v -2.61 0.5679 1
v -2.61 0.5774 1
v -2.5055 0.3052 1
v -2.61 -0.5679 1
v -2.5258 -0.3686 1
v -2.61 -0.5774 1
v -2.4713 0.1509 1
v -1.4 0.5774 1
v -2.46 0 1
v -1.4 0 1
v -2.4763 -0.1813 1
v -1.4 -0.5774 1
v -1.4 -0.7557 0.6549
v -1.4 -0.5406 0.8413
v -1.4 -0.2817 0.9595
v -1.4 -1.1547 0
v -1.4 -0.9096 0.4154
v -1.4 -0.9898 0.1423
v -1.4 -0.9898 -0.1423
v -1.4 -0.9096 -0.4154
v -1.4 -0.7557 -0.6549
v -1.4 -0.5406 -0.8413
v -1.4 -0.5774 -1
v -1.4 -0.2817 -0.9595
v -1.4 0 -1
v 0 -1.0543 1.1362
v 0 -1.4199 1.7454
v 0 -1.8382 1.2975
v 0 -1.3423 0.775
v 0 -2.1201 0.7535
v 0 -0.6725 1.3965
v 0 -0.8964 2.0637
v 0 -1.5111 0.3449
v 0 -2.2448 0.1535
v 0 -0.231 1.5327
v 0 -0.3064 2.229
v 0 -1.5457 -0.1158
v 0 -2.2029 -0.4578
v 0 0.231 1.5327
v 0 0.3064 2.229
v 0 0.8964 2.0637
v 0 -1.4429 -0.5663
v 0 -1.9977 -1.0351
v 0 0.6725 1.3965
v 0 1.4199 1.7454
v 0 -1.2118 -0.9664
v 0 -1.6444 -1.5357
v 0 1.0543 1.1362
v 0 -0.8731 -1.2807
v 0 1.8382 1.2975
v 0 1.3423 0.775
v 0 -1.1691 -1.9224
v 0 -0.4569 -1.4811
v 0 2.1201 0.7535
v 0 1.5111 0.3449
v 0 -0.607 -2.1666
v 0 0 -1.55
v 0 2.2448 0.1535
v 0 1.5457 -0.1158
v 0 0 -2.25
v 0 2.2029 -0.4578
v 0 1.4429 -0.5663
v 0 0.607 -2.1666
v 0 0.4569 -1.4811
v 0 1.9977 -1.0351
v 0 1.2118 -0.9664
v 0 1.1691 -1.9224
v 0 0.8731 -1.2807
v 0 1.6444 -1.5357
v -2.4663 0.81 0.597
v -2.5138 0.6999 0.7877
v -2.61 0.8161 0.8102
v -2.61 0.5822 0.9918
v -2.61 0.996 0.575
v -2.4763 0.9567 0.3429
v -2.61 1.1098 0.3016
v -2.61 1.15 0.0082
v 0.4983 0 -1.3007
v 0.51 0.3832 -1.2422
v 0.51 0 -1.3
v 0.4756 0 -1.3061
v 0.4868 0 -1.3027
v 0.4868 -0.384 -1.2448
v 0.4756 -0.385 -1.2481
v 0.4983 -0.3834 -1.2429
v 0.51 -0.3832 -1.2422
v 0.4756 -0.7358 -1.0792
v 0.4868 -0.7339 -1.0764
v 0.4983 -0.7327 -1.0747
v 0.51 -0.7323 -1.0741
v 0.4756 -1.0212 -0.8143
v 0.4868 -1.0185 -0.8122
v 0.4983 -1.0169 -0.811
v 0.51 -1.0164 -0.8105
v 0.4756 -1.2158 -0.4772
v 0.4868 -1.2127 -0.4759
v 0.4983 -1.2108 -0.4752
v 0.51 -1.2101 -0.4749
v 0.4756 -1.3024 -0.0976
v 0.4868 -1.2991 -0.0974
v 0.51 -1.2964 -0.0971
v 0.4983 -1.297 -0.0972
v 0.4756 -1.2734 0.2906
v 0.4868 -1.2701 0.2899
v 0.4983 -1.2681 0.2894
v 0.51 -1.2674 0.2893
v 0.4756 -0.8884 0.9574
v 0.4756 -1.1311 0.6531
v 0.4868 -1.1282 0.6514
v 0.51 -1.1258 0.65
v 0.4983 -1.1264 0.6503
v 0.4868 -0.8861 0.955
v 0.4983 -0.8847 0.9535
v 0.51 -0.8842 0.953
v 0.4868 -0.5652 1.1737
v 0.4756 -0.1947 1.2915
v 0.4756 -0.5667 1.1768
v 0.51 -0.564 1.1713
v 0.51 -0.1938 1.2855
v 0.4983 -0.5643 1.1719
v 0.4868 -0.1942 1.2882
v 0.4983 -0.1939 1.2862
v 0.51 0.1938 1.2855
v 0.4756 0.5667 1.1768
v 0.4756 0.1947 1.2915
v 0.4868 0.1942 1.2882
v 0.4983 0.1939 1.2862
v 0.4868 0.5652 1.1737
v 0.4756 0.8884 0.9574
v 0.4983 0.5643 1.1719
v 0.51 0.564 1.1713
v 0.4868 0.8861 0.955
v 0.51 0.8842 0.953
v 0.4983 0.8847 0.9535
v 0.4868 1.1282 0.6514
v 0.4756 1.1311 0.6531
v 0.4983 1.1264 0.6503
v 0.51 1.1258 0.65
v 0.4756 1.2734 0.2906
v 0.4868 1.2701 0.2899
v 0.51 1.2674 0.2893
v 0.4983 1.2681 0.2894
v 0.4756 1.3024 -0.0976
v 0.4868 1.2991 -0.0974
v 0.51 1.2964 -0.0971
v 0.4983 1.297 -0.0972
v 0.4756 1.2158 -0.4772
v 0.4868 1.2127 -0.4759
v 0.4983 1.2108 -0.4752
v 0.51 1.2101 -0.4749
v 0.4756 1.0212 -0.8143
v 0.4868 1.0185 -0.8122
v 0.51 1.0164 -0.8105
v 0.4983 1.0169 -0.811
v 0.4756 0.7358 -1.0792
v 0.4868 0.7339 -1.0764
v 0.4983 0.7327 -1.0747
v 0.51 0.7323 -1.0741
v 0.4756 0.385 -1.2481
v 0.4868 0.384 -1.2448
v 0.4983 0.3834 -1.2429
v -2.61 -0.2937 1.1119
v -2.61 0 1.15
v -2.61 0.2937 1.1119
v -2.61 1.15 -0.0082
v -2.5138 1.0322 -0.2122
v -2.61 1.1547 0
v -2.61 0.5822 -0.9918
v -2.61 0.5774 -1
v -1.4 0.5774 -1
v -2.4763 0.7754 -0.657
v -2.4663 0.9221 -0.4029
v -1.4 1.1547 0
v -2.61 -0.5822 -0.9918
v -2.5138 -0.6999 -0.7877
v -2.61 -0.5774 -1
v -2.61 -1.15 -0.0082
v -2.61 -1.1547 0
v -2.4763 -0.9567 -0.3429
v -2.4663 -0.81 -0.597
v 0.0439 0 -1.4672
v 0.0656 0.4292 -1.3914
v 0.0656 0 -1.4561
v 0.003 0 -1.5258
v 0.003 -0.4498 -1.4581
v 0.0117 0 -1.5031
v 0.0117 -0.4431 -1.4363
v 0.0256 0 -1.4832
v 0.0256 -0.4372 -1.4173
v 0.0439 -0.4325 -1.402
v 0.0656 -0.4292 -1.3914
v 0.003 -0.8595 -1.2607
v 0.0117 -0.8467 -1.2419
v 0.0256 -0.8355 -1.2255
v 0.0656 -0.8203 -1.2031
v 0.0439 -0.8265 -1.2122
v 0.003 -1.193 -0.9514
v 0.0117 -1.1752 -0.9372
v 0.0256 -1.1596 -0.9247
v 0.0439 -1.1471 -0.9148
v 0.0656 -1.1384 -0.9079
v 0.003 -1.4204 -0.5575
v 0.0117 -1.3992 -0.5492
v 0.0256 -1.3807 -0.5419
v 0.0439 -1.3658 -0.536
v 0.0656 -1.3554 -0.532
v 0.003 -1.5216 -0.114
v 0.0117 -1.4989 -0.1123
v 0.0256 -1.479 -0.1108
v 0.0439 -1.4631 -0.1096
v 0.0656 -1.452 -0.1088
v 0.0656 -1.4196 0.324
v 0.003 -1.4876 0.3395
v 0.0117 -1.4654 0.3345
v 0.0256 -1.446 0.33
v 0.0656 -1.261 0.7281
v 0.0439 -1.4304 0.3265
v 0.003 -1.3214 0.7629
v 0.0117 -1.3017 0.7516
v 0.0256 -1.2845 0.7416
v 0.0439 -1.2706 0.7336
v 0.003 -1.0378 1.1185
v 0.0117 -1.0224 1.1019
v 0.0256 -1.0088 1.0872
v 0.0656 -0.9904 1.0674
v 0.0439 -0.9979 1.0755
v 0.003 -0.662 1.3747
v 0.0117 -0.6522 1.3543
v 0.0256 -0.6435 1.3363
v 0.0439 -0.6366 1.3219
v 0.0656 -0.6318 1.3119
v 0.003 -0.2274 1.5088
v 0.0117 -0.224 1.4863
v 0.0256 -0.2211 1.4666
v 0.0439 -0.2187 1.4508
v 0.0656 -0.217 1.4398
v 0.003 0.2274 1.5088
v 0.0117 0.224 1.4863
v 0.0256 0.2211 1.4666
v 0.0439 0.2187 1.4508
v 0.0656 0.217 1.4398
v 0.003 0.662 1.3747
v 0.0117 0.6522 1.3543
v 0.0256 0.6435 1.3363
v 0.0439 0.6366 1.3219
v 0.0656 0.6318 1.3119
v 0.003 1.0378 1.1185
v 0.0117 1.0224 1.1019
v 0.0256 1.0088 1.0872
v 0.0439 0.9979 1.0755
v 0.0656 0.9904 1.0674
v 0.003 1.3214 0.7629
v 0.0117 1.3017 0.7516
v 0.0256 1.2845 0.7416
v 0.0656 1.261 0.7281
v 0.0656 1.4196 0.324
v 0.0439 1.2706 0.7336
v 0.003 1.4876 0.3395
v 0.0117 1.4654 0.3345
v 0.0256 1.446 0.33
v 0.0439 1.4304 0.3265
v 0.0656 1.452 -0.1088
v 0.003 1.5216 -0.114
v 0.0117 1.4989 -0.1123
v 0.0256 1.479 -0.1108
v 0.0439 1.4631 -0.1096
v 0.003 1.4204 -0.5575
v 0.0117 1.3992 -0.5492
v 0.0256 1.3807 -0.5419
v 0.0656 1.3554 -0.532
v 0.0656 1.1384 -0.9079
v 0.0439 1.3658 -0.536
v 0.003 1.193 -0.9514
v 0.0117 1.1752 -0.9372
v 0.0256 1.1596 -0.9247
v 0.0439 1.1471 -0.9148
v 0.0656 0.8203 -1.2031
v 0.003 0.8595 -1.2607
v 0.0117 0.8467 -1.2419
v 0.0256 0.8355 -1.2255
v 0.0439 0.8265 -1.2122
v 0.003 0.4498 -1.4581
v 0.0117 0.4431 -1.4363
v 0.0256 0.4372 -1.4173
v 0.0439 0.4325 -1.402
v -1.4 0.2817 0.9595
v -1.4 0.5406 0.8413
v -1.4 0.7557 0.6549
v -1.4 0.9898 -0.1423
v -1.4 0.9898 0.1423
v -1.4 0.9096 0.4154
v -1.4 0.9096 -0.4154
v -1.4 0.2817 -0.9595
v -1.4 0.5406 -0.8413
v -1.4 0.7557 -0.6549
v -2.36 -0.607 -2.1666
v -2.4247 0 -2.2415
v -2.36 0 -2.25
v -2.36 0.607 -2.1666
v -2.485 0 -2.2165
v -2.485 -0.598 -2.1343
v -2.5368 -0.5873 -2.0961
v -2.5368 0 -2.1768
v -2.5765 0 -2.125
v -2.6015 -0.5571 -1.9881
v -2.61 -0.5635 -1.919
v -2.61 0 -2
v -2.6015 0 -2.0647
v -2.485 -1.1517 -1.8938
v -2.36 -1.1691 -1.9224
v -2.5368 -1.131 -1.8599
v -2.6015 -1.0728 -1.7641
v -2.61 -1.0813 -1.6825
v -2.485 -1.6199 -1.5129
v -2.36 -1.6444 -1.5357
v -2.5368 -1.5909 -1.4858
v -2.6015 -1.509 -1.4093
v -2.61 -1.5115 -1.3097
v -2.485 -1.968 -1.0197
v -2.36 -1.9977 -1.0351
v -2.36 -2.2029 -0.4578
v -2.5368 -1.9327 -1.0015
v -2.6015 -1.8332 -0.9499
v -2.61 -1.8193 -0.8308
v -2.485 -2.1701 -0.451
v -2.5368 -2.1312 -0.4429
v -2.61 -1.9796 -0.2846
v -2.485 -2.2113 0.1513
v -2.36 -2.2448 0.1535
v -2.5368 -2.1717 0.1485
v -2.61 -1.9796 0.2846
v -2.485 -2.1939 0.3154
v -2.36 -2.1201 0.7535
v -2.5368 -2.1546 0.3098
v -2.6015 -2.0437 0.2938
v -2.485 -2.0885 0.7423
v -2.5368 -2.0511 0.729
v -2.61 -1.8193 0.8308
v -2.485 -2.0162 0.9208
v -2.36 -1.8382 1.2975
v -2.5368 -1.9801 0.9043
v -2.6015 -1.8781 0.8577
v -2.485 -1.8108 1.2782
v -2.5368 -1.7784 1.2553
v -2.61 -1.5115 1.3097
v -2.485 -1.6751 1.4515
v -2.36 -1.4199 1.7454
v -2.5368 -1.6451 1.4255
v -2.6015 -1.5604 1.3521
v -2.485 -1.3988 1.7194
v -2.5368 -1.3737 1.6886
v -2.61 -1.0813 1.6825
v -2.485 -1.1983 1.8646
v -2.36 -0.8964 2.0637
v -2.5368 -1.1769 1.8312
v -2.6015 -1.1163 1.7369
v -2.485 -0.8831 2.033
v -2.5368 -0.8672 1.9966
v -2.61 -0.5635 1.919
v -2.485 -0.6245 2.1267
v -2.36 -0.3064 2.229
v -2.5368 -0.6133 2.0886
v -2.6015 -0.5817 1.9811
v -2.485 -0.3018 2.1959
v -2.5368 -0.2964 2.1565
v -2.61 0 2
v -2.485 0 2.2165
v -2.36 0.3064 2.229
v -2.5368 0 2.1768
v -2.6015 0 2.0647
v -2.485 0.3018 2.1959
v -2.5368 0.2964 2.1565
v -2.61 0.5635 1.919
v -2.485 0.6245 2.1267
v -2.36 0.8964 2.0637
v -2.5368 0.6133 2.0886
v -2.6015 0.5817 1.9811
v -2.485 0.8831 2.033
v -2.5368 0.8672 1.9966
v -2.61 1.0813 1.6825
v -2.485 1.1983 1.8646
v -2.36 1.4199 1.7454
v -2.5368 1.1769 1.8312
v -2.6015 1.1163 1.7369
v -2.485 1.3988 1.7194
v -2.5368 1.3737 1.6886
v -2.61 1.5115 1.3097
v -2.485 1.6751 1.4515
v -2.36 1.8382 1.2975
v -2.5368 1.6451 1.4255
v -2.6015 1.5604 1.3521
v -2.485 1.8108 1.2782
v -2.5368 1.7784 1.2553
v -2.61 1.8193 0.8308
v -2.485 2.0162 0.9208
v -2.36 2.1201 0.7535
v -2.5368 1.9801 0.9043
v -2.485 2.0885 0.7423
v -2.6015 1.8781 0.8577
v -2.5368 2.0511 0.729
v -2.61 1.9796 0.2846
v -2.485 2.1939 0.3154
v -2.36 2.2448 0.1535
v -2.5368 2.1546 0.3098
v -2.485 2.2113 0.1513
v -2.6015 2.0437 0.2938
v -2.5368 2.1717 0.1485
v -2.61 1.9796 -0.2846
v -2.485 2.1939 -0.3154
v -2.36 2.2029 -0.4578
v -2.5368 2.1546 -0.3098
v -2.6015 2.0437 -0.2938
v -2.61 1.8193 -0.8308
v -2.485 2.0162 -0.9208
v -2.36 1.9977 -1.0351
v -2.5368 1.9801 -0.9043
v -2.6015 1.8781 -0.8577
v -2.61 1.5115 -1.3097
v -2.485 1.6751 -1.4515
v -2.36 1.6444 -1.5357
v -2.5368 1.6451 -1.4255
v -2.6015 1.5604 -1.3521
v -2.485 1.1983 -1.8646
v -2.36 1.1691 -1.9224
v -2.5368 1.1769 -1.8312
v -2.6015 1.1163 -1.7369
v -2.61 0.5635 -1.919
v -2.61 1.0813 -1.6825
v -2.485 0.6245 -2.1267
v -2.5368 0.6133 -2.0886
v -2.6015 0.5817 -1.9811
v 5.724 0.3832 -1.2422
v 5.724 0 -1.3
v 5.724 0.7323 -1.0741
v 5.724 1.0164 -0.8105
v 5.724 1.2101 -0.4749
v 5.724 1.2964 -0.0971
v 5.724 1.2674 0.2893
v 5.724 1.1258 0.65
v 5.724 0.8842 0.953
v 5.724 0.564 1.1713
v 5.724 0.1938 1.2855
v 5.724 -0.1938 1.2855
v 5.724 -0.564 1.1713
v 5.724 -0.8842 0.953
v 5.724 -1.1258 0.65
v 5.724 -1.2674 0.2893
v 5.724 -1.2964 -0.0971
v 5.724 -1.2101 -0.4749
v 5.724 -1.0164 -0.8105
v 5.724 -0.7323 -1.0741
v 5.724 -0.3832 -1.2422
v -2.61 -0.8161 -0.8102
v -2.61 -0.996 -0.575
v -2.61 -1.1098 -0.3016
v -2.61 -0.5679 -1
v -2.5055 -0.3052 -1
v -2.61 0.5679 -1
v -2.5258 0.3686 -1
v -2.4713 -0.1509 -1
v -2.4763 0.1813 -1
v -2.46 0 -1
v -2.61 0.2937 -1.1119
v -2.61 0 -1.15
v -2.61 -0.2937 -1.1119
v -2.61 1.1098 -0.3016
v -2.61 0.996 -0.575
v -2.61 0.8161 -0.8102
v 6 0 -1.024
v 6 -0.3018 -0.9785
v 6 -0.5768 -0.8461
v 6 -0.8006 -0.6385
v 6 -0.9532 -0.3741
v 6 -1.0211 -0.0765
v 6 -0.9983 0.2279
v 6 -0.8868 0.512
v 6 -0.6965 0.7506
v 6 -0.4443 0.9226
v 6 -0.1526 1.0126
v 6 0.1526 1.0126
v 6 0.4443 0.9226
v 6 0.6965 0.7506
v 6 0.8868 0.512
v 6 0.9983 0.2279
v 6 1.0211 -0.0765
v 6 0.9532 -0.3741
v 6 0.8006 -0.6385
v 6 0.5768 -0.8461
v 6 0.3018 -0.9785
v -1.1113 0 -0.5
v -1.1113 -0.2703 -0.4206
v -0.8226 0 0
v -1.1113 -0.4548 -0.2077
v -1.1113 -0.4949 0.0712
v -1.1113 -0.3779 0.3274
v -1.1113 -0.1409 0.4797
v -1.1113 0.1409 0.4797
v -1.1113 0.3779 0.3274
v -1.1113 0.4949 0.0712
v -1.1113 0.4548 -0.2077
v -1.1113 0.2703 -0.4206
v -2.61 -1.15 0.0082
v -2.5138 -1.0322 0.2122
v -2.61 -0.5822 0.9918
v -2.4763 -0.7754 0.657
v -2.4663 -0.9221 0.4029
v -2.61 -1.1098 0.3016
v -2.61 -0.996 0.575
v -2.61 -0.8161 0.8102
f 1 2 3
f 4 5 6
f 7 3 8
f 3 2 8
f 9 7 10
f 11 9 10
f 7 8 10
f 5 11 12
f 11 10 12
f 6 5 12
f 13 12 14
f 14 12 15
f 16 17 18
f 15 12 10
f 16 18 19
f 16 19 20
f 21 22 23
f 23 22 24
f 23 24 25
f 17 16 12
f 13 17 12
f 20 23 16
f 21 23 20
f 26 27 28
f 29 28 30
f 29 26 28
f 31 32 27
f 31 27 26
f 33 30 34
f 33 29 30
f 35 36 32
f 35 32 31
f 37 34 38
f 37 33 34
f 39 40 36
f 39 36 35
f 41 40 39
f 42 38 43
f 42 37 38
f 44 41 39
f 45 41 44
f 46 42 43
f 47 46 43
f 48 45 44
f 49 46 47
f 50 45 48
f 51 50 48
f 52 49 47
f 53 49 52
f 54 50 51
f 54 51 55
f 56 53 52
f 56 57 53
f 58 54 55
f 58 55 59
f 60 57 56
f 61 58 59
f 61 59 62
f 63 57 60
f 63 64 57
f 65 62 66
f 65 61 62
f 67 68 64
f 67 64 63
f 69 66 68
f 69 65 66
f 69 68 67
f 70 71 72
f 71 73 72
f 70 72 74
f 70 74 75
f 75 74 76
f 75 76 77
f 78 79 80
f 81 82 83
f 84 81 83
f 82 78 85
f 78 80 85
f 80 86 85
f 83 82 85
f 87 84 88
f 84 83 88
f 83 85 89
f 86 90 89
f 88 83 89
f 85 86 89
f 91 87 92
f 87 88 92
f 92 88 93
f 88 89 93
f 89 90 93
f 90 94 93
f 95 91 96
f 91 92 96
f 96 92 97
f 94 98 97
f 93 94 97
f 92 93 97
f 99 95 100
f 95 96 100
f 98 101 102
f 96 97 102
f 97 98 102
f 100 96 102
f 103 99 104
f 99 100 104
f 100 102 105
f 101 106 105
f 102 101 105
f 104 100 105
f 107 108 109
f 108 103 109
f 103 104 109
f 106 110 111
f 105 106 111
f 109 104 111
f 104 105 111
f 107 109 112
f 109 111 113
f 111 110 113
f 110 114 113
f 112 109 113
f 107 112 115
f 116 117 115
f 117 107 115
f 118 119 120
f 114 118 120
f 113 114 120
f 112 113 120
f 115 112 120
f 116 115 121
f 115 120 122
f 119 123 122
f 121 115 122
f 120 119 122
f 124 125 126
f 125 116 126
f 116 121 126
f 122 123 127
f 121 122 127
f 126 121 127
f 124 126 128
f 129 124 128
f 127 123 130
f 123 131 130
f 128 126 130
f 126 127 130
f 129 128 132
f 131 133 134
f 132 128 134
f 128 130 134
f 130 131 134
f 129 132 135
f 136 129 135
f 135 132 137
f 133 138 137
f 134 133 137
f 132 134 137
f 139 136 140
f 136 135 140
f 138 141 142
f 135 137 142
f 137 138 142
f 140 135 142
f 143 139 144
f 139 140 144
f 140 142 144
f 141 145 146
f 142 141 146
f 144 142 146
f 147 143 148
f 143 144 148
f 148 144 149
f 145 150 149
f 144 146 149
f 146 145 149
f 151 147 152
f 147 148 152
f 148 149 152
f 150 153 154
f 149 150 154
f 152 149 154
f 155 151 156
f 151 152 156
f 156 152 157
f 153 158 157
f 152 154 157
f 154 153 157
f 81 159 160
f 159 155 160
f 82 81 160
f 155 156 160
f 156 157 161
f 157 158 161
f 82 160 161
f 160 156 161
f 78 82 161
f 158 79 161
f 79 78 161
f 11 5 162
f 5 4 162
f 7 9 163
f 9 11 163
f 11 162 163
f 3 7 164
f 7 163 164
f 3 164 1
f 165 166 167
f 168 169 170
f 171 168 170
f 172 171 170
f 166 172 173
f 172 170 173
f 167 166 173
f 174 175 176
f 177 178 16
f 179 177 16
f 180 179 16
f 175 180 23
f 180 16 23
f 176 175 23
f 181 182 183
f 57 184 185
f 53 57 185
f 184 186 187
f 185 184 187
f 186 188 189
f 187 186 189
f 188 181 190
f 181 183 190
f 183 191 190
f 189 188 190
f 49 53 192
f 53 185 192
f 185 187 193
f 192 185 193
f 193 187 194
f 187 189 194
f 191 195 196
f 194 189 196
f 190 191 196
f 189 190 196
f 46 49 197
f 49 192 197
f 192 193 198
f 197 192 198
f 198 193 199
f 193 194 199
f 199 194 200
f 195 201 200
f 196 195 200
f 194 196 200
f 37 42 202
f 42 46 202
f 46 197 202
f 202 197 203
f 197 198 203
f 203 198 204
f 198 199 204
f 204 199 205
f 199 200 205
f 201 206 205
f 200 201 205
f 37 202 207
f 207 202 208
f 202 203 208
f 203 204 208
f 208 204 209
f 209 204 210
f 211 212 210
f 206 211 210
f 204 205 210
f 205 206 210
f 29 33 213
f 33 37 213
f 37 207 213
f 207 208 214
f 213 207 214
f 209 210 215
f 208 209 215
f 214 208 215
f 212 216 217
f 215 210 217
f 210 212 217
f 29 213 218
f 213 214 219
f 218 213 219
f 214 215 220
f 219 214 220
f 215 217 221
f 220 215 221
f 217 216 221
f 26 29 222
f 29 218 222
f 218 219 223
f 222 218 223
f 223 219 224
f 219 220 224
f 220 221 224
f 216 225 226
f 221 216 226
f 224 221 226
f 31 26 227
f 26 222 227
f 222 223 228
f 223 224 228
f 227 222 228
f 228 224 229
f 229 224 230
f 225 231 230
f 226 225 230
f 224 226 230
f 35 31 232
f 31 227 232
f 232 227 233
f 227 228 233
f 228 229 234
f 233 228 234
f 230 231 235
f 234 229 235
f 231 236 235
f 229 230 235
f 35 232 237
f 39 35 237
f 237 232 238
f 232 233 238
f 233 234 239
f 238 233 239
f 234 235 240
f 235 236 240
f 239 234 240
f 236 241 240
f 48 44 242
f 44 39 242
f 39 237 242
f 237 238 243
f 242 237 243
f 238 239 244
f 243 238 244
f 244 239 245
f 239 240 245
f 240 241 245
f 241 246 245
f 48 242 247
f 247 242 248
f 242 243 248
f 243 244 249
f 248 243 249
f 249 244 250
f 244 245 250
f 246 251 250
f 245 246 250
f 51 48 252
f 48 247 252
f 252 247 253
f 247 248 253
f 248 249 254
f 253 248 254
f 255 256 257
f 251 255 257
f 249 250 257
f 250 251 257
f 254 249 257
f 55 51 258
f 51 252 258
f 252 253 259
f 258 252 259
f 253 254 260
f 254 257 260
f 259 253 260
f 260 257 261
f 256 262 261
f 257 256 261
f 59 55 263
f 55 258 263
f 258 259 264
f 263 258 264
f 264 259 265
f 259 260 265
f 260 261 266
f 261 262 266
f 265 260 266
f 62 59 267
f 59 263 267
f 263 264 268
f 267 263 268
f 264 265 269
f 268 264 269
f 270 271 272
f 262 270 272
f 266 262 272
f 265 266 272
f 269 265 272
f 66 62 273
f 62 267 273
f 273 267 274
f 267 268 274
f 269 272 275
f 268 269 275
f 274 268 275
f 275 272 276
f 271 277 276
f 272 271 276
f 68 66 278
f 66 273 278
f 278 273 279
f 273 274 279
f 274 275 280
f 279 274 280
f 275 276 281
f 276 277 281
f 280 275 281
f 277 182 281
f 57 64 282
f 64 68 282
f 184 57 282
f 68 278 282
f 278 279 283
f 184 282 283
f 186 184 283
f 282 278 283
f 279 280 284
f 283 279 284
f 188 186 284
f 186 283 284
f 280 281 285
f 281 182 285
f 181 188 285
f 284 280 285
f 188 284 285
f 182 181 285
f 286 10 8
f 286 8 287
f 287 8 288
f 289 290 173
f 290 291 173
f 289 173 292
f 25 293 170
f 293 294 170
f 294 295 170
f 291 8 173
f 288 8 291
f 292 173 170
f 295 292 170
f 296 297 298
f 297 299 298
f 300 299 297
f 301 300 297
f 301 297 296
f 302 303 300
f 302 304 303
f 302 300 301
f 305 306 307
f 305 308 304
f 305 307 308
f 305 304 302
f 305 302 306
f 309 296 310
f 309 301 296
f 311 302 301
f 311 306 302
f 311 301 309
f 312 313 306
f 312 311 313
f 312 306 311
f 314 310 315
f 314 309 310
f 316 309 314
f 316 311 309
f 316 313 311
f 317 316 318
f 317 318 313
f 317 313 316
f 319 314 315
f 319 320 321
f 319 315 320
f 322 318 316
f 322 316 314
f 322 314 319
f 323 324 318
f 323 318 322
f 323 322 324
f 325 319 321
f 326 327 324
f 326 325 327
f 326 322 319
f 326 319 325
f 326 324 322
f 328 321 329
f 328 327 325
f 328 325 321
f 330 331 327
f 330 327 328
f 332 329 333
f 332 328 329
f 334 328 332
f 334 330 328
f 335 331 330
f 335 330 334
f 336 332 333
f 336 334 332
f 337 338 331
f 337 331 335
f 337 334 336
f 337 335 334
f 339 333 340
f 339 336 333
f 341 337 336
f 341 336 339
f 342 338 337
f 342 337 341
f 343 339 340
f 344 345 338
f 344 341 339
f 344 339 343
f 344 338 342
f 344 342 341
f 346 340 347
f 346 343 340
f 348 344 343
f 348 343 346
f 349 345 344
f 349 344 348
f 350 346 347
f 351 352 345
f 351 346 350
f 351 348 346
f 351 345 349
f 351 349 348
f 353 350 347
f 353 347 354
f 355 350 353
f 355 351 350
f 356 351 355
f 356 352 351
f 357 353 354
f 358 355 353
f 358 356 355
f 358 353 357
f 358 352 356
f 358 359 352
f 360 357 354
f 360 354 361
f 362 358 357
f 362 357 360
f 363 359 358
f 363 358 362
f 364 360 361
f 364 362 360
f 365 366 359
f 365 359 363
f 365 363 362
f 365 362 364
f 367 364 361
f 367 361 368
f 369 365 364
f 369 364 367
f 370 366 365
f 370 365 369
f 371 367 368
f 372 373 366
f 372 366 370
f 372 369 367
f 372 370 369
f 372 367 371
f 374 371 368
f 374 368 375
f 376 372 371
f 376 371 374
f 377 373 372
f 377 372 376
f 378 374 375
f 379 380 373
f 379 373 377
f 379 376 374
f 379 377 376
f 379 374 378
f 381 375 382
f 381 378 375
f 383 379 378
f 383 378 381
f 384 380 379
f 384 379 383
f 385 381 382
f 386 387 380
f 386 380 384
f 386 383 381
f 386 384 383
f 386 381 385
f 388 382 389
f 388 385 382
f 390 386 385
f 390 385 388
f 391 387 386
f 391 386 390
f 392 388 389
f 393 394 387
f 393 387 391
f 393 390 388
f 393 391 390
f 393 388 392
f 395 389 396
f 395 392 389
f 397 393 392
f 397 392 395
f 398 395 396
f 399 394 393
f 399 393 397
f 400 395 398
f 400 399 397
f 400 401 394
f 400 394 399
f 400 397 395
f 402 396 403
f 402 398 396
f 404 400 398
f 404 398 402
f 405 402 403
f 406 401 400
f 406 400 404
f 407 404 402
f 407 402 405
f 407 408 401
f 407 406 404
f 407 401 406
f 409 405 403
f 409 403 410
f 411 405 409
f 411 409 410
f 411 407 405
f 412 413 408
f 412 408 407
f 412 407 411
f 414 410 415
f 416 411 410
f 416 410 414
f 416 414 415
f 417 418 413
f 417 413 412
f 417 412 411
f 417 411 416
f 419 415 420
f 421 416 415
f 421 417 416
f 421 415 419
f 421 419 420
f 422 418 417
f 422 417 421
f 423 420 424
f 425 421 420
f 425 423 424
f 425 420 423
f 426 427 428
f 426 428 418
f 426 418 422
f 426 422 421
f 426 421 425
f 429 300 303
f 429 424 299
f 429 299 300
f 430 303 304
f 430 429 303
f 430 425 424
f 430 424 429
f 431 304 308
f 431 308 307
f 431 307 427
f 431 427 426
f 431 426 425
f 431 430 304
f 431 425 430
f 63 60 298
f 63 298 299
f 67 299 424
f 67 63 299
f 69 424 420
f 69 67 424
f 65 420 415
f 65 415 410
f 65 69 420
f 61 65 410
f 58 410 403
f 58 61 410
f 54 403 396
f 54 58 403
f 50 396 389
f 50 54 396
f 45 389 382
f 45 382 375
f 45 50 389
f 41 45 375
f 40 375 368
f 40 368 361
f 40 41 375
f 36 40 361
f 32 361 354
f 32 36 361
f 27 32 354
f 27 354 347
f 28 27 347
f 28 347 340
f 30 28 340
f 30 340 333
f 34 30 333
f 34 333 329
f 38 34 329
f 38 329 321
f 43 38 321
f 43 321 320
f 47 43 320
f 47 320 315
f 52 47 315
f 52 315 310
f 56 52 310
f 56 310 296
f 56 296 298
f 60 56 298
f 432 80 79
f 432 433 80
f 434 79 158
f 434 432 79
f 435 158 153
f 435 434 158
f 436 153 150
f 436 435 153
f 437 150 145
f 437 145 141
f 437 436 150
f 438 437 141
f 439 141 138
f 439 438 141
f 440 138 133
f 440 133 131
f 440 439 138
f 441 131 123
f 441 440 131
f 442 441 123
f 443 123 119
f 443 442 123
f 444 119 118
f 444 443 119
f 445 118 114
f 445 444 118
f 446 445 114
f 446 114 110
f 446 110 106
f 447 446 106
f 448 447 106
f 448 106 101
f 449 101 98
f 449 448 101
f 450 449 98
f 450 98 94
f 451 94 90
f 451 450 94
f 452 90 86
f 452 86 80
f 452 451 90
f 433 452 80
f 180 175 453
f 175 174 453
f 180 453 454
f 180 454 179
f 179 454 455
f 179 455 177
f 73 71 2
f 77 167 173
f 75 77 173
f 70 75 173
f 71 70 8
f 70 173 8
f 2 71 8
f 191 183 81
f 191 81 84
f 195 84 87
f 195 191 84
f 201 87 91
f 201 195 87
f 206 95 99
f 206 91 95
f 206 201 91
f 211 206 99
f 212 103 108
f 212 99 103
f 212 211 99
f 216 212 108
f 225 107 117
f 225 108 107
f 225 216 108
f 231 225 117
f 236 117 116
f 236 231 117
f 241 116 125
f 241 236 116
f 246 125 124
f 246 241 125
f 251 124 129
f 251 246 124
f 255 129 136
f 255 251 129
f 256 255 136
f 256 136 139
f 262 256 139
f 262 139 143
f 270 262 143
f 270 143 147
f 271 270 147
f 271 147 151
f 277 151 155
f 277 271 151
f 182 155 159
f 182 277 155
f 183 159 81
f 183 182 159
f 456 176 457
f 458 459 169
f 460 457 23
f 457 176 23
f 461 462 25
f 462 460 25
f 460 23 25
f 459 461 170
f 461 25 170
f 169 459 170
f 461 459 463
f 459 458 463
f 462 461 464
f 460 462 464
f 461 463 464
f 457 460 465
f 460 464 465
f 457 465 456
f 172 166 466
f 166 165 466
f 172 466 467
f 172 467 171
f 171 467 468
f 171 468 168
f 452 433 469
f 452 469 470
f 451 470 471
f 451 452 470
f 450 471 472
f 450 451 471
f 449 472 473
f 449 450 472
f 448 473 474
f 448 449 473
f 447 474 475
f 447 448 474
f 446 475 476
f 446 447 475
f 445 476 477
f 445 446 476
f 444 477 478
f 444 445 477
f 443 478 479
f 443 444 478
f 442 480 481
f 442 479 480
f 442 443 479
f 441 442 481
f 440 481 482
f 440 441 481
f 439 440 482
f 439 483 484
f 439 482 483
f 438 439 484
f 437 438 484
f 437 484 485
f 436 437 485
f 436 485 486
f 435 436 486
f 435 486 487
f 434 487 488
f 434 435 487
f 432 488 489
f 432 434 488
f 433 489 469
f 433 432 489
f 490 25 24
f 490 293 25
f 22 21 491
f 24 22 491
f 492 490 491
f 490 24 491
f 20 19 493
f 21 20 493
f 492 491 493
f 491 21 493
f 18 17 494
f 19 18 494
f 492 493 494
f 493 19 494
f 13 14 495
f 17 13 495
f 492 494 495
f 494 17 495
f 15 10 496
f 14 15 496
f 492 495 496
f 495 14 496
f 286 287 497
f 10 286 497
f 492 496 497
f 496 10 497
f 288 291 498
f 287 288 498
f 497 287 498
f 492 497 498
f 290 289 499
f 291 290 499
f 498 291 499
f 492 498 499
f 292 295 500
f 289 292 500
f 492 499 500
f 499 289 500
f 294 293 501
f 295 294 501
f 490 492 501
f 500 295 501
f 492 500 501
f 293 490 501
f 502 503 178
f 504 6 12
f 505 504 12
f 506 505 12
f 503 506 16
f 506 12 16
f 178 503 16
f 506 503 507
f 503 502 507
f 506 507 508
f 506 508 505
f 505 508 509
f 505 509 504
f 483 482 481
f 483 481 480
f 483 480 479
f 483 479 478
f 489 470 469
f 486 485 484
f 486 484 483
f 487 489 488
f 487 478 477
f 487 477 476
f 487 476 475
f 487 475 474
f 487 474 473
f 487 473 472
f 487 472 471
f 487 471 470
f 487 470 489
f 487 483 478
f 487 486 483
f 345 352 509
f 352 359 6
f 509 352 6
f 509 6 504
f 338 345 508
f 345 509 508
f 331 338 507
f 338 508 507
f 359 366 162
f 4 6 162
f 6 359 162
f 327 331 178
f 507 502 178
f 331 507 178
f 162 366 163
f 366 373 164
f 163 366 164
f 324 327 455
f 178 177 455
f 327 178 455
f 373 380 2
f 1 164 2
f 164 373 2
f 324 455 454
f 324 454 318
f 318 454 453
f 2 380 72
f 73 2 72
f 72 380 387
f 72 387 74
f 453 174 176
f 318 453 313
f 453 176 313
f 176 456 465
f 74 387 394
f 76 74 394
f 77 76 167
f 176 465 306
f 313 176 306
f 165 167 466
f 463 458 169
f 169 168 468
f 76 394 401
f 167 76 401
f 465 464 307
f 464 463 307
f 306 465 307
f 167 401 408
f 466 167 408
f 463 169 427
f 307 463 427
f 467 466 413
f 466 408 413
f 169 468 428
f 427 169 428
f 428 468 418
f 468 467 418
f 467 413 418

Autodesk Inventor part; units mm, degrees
sketch "Sketch_1" plane through (0, 0, 0) normal (0, 1, 0) x (-1, 0, 0)
  line L0 (-6, 0) -> (2.61, 0)
  line L1 (0.8226, 0) -> (1.4, -1)
  line L2 (1.4, -1) -> (2.46, -1)
  line L3 (2.46, -1) -> (2.61, -1.15)
  line L4 (2.61, -1.15) -> (2.61, -2)
  arc A0 (2.36, -2.25) -> (2.61, -2) centre (2.36, -2) ccw
  line L5 (2.36, -2.25) -> (0, -2.25)
  line L6 (0, -2.25) -> (0, -1.55)
  arc A1 (0, -1.55) -> (-0.0656, -1.4561) centre (-0.1, -1.55) ccw
  line L7 (-0.0656, -1.4561) -> (-0.4756, -1.3061)
  arc A2 (-0.4756, -1.3061) -> (-0.51, -1.3) centre (-0.51, -1.4) ccw
  line L8 (-0.51, -1.3) -> (-5.724, -1.3)
  line L9 (-5.724, -1.3) -> (-6, -1.024)
  line L10 (-6, -1.024) -> (-6, 0)
  line L11 (-6, 0) -> (0.8226, 0)
revolve "Revolution1" add sketch "Sketch_1" angle 360 about axis through (6, 0, 0) along (1, 0, 0)
thread "Thread1" size "M2.6x0.45" class "6g" standard "ISO Metric profile" length 3.724
sketch "Skizze_1" plane through (-1.4, 0, 0) normal (1, 0, 0) x (0, 0, -1)
  line L0 (-1, -0.5774) -> (0, -1.1547)
  line L1 (0, -1.1547) -> (1, -0.5774)
  line L2 (1, -0.5774) -> (1, 0.5774)
  line L3 (1, 0.5774) -> (0, 1.1547)
  line L4 (0, 1.1547) -> (-1, 0.5774)
  line L5 (-1, 0.5774) -> (-1, -0.5774)
extrude "Extrusion1" cut sketch "Skizze_1" against normal blind 2.2
ref_plane "IP1_XY" through (0, 0, 0) normal (1, 0, 0) x (0, 0, -1)
ref_plane "IP1_YZ" through (0, 0, 0) normal (0, 0, -1) x (0, 1, 0)
ref_plane "IP1_ZX" through (0, 0, 0) normal (0, 1, 0) x (1, 0, 0)
ref_plane "IP2_XY" through (-2.6, 0, 0) normal (1, 0, 0) x (0, 0, -1)
ref_plane "IP2_YZ" through (-2.6, 0, 0) normal (0, 0, -1) x (0, 1, 0)
ref_plane "IP2_ZX" through (-2.6, 0, 0) normal (0, 1, 0) x (1, 0, 0)
ref_plane "IP3_XY" through (6, 0, 0) normal (1, 0, 0) x (0, 0, -1)
ref_plane "IP3_YZ" through (6, 0, 0) normal (0, 0, -1) x (0, 1, 0)
ref_plane "IP3_ZX" through (6, 0, 0) normal (0, 1, 0) x (1, 0, 0)
ref_plane "IP4_XY" through (0, 0, 0) normal (1, 0, 0) x (0, 0, -1)
ref_plane "IP4_YZ" through (0, 0, 0) normal (0, 0, -1) x (0, 1, 0)
ref_plane "IP4_ZX" through (0, 0, 0) normal (0, 1, 0) x (1, 0, 0)
properties part number "M2.6x66"
